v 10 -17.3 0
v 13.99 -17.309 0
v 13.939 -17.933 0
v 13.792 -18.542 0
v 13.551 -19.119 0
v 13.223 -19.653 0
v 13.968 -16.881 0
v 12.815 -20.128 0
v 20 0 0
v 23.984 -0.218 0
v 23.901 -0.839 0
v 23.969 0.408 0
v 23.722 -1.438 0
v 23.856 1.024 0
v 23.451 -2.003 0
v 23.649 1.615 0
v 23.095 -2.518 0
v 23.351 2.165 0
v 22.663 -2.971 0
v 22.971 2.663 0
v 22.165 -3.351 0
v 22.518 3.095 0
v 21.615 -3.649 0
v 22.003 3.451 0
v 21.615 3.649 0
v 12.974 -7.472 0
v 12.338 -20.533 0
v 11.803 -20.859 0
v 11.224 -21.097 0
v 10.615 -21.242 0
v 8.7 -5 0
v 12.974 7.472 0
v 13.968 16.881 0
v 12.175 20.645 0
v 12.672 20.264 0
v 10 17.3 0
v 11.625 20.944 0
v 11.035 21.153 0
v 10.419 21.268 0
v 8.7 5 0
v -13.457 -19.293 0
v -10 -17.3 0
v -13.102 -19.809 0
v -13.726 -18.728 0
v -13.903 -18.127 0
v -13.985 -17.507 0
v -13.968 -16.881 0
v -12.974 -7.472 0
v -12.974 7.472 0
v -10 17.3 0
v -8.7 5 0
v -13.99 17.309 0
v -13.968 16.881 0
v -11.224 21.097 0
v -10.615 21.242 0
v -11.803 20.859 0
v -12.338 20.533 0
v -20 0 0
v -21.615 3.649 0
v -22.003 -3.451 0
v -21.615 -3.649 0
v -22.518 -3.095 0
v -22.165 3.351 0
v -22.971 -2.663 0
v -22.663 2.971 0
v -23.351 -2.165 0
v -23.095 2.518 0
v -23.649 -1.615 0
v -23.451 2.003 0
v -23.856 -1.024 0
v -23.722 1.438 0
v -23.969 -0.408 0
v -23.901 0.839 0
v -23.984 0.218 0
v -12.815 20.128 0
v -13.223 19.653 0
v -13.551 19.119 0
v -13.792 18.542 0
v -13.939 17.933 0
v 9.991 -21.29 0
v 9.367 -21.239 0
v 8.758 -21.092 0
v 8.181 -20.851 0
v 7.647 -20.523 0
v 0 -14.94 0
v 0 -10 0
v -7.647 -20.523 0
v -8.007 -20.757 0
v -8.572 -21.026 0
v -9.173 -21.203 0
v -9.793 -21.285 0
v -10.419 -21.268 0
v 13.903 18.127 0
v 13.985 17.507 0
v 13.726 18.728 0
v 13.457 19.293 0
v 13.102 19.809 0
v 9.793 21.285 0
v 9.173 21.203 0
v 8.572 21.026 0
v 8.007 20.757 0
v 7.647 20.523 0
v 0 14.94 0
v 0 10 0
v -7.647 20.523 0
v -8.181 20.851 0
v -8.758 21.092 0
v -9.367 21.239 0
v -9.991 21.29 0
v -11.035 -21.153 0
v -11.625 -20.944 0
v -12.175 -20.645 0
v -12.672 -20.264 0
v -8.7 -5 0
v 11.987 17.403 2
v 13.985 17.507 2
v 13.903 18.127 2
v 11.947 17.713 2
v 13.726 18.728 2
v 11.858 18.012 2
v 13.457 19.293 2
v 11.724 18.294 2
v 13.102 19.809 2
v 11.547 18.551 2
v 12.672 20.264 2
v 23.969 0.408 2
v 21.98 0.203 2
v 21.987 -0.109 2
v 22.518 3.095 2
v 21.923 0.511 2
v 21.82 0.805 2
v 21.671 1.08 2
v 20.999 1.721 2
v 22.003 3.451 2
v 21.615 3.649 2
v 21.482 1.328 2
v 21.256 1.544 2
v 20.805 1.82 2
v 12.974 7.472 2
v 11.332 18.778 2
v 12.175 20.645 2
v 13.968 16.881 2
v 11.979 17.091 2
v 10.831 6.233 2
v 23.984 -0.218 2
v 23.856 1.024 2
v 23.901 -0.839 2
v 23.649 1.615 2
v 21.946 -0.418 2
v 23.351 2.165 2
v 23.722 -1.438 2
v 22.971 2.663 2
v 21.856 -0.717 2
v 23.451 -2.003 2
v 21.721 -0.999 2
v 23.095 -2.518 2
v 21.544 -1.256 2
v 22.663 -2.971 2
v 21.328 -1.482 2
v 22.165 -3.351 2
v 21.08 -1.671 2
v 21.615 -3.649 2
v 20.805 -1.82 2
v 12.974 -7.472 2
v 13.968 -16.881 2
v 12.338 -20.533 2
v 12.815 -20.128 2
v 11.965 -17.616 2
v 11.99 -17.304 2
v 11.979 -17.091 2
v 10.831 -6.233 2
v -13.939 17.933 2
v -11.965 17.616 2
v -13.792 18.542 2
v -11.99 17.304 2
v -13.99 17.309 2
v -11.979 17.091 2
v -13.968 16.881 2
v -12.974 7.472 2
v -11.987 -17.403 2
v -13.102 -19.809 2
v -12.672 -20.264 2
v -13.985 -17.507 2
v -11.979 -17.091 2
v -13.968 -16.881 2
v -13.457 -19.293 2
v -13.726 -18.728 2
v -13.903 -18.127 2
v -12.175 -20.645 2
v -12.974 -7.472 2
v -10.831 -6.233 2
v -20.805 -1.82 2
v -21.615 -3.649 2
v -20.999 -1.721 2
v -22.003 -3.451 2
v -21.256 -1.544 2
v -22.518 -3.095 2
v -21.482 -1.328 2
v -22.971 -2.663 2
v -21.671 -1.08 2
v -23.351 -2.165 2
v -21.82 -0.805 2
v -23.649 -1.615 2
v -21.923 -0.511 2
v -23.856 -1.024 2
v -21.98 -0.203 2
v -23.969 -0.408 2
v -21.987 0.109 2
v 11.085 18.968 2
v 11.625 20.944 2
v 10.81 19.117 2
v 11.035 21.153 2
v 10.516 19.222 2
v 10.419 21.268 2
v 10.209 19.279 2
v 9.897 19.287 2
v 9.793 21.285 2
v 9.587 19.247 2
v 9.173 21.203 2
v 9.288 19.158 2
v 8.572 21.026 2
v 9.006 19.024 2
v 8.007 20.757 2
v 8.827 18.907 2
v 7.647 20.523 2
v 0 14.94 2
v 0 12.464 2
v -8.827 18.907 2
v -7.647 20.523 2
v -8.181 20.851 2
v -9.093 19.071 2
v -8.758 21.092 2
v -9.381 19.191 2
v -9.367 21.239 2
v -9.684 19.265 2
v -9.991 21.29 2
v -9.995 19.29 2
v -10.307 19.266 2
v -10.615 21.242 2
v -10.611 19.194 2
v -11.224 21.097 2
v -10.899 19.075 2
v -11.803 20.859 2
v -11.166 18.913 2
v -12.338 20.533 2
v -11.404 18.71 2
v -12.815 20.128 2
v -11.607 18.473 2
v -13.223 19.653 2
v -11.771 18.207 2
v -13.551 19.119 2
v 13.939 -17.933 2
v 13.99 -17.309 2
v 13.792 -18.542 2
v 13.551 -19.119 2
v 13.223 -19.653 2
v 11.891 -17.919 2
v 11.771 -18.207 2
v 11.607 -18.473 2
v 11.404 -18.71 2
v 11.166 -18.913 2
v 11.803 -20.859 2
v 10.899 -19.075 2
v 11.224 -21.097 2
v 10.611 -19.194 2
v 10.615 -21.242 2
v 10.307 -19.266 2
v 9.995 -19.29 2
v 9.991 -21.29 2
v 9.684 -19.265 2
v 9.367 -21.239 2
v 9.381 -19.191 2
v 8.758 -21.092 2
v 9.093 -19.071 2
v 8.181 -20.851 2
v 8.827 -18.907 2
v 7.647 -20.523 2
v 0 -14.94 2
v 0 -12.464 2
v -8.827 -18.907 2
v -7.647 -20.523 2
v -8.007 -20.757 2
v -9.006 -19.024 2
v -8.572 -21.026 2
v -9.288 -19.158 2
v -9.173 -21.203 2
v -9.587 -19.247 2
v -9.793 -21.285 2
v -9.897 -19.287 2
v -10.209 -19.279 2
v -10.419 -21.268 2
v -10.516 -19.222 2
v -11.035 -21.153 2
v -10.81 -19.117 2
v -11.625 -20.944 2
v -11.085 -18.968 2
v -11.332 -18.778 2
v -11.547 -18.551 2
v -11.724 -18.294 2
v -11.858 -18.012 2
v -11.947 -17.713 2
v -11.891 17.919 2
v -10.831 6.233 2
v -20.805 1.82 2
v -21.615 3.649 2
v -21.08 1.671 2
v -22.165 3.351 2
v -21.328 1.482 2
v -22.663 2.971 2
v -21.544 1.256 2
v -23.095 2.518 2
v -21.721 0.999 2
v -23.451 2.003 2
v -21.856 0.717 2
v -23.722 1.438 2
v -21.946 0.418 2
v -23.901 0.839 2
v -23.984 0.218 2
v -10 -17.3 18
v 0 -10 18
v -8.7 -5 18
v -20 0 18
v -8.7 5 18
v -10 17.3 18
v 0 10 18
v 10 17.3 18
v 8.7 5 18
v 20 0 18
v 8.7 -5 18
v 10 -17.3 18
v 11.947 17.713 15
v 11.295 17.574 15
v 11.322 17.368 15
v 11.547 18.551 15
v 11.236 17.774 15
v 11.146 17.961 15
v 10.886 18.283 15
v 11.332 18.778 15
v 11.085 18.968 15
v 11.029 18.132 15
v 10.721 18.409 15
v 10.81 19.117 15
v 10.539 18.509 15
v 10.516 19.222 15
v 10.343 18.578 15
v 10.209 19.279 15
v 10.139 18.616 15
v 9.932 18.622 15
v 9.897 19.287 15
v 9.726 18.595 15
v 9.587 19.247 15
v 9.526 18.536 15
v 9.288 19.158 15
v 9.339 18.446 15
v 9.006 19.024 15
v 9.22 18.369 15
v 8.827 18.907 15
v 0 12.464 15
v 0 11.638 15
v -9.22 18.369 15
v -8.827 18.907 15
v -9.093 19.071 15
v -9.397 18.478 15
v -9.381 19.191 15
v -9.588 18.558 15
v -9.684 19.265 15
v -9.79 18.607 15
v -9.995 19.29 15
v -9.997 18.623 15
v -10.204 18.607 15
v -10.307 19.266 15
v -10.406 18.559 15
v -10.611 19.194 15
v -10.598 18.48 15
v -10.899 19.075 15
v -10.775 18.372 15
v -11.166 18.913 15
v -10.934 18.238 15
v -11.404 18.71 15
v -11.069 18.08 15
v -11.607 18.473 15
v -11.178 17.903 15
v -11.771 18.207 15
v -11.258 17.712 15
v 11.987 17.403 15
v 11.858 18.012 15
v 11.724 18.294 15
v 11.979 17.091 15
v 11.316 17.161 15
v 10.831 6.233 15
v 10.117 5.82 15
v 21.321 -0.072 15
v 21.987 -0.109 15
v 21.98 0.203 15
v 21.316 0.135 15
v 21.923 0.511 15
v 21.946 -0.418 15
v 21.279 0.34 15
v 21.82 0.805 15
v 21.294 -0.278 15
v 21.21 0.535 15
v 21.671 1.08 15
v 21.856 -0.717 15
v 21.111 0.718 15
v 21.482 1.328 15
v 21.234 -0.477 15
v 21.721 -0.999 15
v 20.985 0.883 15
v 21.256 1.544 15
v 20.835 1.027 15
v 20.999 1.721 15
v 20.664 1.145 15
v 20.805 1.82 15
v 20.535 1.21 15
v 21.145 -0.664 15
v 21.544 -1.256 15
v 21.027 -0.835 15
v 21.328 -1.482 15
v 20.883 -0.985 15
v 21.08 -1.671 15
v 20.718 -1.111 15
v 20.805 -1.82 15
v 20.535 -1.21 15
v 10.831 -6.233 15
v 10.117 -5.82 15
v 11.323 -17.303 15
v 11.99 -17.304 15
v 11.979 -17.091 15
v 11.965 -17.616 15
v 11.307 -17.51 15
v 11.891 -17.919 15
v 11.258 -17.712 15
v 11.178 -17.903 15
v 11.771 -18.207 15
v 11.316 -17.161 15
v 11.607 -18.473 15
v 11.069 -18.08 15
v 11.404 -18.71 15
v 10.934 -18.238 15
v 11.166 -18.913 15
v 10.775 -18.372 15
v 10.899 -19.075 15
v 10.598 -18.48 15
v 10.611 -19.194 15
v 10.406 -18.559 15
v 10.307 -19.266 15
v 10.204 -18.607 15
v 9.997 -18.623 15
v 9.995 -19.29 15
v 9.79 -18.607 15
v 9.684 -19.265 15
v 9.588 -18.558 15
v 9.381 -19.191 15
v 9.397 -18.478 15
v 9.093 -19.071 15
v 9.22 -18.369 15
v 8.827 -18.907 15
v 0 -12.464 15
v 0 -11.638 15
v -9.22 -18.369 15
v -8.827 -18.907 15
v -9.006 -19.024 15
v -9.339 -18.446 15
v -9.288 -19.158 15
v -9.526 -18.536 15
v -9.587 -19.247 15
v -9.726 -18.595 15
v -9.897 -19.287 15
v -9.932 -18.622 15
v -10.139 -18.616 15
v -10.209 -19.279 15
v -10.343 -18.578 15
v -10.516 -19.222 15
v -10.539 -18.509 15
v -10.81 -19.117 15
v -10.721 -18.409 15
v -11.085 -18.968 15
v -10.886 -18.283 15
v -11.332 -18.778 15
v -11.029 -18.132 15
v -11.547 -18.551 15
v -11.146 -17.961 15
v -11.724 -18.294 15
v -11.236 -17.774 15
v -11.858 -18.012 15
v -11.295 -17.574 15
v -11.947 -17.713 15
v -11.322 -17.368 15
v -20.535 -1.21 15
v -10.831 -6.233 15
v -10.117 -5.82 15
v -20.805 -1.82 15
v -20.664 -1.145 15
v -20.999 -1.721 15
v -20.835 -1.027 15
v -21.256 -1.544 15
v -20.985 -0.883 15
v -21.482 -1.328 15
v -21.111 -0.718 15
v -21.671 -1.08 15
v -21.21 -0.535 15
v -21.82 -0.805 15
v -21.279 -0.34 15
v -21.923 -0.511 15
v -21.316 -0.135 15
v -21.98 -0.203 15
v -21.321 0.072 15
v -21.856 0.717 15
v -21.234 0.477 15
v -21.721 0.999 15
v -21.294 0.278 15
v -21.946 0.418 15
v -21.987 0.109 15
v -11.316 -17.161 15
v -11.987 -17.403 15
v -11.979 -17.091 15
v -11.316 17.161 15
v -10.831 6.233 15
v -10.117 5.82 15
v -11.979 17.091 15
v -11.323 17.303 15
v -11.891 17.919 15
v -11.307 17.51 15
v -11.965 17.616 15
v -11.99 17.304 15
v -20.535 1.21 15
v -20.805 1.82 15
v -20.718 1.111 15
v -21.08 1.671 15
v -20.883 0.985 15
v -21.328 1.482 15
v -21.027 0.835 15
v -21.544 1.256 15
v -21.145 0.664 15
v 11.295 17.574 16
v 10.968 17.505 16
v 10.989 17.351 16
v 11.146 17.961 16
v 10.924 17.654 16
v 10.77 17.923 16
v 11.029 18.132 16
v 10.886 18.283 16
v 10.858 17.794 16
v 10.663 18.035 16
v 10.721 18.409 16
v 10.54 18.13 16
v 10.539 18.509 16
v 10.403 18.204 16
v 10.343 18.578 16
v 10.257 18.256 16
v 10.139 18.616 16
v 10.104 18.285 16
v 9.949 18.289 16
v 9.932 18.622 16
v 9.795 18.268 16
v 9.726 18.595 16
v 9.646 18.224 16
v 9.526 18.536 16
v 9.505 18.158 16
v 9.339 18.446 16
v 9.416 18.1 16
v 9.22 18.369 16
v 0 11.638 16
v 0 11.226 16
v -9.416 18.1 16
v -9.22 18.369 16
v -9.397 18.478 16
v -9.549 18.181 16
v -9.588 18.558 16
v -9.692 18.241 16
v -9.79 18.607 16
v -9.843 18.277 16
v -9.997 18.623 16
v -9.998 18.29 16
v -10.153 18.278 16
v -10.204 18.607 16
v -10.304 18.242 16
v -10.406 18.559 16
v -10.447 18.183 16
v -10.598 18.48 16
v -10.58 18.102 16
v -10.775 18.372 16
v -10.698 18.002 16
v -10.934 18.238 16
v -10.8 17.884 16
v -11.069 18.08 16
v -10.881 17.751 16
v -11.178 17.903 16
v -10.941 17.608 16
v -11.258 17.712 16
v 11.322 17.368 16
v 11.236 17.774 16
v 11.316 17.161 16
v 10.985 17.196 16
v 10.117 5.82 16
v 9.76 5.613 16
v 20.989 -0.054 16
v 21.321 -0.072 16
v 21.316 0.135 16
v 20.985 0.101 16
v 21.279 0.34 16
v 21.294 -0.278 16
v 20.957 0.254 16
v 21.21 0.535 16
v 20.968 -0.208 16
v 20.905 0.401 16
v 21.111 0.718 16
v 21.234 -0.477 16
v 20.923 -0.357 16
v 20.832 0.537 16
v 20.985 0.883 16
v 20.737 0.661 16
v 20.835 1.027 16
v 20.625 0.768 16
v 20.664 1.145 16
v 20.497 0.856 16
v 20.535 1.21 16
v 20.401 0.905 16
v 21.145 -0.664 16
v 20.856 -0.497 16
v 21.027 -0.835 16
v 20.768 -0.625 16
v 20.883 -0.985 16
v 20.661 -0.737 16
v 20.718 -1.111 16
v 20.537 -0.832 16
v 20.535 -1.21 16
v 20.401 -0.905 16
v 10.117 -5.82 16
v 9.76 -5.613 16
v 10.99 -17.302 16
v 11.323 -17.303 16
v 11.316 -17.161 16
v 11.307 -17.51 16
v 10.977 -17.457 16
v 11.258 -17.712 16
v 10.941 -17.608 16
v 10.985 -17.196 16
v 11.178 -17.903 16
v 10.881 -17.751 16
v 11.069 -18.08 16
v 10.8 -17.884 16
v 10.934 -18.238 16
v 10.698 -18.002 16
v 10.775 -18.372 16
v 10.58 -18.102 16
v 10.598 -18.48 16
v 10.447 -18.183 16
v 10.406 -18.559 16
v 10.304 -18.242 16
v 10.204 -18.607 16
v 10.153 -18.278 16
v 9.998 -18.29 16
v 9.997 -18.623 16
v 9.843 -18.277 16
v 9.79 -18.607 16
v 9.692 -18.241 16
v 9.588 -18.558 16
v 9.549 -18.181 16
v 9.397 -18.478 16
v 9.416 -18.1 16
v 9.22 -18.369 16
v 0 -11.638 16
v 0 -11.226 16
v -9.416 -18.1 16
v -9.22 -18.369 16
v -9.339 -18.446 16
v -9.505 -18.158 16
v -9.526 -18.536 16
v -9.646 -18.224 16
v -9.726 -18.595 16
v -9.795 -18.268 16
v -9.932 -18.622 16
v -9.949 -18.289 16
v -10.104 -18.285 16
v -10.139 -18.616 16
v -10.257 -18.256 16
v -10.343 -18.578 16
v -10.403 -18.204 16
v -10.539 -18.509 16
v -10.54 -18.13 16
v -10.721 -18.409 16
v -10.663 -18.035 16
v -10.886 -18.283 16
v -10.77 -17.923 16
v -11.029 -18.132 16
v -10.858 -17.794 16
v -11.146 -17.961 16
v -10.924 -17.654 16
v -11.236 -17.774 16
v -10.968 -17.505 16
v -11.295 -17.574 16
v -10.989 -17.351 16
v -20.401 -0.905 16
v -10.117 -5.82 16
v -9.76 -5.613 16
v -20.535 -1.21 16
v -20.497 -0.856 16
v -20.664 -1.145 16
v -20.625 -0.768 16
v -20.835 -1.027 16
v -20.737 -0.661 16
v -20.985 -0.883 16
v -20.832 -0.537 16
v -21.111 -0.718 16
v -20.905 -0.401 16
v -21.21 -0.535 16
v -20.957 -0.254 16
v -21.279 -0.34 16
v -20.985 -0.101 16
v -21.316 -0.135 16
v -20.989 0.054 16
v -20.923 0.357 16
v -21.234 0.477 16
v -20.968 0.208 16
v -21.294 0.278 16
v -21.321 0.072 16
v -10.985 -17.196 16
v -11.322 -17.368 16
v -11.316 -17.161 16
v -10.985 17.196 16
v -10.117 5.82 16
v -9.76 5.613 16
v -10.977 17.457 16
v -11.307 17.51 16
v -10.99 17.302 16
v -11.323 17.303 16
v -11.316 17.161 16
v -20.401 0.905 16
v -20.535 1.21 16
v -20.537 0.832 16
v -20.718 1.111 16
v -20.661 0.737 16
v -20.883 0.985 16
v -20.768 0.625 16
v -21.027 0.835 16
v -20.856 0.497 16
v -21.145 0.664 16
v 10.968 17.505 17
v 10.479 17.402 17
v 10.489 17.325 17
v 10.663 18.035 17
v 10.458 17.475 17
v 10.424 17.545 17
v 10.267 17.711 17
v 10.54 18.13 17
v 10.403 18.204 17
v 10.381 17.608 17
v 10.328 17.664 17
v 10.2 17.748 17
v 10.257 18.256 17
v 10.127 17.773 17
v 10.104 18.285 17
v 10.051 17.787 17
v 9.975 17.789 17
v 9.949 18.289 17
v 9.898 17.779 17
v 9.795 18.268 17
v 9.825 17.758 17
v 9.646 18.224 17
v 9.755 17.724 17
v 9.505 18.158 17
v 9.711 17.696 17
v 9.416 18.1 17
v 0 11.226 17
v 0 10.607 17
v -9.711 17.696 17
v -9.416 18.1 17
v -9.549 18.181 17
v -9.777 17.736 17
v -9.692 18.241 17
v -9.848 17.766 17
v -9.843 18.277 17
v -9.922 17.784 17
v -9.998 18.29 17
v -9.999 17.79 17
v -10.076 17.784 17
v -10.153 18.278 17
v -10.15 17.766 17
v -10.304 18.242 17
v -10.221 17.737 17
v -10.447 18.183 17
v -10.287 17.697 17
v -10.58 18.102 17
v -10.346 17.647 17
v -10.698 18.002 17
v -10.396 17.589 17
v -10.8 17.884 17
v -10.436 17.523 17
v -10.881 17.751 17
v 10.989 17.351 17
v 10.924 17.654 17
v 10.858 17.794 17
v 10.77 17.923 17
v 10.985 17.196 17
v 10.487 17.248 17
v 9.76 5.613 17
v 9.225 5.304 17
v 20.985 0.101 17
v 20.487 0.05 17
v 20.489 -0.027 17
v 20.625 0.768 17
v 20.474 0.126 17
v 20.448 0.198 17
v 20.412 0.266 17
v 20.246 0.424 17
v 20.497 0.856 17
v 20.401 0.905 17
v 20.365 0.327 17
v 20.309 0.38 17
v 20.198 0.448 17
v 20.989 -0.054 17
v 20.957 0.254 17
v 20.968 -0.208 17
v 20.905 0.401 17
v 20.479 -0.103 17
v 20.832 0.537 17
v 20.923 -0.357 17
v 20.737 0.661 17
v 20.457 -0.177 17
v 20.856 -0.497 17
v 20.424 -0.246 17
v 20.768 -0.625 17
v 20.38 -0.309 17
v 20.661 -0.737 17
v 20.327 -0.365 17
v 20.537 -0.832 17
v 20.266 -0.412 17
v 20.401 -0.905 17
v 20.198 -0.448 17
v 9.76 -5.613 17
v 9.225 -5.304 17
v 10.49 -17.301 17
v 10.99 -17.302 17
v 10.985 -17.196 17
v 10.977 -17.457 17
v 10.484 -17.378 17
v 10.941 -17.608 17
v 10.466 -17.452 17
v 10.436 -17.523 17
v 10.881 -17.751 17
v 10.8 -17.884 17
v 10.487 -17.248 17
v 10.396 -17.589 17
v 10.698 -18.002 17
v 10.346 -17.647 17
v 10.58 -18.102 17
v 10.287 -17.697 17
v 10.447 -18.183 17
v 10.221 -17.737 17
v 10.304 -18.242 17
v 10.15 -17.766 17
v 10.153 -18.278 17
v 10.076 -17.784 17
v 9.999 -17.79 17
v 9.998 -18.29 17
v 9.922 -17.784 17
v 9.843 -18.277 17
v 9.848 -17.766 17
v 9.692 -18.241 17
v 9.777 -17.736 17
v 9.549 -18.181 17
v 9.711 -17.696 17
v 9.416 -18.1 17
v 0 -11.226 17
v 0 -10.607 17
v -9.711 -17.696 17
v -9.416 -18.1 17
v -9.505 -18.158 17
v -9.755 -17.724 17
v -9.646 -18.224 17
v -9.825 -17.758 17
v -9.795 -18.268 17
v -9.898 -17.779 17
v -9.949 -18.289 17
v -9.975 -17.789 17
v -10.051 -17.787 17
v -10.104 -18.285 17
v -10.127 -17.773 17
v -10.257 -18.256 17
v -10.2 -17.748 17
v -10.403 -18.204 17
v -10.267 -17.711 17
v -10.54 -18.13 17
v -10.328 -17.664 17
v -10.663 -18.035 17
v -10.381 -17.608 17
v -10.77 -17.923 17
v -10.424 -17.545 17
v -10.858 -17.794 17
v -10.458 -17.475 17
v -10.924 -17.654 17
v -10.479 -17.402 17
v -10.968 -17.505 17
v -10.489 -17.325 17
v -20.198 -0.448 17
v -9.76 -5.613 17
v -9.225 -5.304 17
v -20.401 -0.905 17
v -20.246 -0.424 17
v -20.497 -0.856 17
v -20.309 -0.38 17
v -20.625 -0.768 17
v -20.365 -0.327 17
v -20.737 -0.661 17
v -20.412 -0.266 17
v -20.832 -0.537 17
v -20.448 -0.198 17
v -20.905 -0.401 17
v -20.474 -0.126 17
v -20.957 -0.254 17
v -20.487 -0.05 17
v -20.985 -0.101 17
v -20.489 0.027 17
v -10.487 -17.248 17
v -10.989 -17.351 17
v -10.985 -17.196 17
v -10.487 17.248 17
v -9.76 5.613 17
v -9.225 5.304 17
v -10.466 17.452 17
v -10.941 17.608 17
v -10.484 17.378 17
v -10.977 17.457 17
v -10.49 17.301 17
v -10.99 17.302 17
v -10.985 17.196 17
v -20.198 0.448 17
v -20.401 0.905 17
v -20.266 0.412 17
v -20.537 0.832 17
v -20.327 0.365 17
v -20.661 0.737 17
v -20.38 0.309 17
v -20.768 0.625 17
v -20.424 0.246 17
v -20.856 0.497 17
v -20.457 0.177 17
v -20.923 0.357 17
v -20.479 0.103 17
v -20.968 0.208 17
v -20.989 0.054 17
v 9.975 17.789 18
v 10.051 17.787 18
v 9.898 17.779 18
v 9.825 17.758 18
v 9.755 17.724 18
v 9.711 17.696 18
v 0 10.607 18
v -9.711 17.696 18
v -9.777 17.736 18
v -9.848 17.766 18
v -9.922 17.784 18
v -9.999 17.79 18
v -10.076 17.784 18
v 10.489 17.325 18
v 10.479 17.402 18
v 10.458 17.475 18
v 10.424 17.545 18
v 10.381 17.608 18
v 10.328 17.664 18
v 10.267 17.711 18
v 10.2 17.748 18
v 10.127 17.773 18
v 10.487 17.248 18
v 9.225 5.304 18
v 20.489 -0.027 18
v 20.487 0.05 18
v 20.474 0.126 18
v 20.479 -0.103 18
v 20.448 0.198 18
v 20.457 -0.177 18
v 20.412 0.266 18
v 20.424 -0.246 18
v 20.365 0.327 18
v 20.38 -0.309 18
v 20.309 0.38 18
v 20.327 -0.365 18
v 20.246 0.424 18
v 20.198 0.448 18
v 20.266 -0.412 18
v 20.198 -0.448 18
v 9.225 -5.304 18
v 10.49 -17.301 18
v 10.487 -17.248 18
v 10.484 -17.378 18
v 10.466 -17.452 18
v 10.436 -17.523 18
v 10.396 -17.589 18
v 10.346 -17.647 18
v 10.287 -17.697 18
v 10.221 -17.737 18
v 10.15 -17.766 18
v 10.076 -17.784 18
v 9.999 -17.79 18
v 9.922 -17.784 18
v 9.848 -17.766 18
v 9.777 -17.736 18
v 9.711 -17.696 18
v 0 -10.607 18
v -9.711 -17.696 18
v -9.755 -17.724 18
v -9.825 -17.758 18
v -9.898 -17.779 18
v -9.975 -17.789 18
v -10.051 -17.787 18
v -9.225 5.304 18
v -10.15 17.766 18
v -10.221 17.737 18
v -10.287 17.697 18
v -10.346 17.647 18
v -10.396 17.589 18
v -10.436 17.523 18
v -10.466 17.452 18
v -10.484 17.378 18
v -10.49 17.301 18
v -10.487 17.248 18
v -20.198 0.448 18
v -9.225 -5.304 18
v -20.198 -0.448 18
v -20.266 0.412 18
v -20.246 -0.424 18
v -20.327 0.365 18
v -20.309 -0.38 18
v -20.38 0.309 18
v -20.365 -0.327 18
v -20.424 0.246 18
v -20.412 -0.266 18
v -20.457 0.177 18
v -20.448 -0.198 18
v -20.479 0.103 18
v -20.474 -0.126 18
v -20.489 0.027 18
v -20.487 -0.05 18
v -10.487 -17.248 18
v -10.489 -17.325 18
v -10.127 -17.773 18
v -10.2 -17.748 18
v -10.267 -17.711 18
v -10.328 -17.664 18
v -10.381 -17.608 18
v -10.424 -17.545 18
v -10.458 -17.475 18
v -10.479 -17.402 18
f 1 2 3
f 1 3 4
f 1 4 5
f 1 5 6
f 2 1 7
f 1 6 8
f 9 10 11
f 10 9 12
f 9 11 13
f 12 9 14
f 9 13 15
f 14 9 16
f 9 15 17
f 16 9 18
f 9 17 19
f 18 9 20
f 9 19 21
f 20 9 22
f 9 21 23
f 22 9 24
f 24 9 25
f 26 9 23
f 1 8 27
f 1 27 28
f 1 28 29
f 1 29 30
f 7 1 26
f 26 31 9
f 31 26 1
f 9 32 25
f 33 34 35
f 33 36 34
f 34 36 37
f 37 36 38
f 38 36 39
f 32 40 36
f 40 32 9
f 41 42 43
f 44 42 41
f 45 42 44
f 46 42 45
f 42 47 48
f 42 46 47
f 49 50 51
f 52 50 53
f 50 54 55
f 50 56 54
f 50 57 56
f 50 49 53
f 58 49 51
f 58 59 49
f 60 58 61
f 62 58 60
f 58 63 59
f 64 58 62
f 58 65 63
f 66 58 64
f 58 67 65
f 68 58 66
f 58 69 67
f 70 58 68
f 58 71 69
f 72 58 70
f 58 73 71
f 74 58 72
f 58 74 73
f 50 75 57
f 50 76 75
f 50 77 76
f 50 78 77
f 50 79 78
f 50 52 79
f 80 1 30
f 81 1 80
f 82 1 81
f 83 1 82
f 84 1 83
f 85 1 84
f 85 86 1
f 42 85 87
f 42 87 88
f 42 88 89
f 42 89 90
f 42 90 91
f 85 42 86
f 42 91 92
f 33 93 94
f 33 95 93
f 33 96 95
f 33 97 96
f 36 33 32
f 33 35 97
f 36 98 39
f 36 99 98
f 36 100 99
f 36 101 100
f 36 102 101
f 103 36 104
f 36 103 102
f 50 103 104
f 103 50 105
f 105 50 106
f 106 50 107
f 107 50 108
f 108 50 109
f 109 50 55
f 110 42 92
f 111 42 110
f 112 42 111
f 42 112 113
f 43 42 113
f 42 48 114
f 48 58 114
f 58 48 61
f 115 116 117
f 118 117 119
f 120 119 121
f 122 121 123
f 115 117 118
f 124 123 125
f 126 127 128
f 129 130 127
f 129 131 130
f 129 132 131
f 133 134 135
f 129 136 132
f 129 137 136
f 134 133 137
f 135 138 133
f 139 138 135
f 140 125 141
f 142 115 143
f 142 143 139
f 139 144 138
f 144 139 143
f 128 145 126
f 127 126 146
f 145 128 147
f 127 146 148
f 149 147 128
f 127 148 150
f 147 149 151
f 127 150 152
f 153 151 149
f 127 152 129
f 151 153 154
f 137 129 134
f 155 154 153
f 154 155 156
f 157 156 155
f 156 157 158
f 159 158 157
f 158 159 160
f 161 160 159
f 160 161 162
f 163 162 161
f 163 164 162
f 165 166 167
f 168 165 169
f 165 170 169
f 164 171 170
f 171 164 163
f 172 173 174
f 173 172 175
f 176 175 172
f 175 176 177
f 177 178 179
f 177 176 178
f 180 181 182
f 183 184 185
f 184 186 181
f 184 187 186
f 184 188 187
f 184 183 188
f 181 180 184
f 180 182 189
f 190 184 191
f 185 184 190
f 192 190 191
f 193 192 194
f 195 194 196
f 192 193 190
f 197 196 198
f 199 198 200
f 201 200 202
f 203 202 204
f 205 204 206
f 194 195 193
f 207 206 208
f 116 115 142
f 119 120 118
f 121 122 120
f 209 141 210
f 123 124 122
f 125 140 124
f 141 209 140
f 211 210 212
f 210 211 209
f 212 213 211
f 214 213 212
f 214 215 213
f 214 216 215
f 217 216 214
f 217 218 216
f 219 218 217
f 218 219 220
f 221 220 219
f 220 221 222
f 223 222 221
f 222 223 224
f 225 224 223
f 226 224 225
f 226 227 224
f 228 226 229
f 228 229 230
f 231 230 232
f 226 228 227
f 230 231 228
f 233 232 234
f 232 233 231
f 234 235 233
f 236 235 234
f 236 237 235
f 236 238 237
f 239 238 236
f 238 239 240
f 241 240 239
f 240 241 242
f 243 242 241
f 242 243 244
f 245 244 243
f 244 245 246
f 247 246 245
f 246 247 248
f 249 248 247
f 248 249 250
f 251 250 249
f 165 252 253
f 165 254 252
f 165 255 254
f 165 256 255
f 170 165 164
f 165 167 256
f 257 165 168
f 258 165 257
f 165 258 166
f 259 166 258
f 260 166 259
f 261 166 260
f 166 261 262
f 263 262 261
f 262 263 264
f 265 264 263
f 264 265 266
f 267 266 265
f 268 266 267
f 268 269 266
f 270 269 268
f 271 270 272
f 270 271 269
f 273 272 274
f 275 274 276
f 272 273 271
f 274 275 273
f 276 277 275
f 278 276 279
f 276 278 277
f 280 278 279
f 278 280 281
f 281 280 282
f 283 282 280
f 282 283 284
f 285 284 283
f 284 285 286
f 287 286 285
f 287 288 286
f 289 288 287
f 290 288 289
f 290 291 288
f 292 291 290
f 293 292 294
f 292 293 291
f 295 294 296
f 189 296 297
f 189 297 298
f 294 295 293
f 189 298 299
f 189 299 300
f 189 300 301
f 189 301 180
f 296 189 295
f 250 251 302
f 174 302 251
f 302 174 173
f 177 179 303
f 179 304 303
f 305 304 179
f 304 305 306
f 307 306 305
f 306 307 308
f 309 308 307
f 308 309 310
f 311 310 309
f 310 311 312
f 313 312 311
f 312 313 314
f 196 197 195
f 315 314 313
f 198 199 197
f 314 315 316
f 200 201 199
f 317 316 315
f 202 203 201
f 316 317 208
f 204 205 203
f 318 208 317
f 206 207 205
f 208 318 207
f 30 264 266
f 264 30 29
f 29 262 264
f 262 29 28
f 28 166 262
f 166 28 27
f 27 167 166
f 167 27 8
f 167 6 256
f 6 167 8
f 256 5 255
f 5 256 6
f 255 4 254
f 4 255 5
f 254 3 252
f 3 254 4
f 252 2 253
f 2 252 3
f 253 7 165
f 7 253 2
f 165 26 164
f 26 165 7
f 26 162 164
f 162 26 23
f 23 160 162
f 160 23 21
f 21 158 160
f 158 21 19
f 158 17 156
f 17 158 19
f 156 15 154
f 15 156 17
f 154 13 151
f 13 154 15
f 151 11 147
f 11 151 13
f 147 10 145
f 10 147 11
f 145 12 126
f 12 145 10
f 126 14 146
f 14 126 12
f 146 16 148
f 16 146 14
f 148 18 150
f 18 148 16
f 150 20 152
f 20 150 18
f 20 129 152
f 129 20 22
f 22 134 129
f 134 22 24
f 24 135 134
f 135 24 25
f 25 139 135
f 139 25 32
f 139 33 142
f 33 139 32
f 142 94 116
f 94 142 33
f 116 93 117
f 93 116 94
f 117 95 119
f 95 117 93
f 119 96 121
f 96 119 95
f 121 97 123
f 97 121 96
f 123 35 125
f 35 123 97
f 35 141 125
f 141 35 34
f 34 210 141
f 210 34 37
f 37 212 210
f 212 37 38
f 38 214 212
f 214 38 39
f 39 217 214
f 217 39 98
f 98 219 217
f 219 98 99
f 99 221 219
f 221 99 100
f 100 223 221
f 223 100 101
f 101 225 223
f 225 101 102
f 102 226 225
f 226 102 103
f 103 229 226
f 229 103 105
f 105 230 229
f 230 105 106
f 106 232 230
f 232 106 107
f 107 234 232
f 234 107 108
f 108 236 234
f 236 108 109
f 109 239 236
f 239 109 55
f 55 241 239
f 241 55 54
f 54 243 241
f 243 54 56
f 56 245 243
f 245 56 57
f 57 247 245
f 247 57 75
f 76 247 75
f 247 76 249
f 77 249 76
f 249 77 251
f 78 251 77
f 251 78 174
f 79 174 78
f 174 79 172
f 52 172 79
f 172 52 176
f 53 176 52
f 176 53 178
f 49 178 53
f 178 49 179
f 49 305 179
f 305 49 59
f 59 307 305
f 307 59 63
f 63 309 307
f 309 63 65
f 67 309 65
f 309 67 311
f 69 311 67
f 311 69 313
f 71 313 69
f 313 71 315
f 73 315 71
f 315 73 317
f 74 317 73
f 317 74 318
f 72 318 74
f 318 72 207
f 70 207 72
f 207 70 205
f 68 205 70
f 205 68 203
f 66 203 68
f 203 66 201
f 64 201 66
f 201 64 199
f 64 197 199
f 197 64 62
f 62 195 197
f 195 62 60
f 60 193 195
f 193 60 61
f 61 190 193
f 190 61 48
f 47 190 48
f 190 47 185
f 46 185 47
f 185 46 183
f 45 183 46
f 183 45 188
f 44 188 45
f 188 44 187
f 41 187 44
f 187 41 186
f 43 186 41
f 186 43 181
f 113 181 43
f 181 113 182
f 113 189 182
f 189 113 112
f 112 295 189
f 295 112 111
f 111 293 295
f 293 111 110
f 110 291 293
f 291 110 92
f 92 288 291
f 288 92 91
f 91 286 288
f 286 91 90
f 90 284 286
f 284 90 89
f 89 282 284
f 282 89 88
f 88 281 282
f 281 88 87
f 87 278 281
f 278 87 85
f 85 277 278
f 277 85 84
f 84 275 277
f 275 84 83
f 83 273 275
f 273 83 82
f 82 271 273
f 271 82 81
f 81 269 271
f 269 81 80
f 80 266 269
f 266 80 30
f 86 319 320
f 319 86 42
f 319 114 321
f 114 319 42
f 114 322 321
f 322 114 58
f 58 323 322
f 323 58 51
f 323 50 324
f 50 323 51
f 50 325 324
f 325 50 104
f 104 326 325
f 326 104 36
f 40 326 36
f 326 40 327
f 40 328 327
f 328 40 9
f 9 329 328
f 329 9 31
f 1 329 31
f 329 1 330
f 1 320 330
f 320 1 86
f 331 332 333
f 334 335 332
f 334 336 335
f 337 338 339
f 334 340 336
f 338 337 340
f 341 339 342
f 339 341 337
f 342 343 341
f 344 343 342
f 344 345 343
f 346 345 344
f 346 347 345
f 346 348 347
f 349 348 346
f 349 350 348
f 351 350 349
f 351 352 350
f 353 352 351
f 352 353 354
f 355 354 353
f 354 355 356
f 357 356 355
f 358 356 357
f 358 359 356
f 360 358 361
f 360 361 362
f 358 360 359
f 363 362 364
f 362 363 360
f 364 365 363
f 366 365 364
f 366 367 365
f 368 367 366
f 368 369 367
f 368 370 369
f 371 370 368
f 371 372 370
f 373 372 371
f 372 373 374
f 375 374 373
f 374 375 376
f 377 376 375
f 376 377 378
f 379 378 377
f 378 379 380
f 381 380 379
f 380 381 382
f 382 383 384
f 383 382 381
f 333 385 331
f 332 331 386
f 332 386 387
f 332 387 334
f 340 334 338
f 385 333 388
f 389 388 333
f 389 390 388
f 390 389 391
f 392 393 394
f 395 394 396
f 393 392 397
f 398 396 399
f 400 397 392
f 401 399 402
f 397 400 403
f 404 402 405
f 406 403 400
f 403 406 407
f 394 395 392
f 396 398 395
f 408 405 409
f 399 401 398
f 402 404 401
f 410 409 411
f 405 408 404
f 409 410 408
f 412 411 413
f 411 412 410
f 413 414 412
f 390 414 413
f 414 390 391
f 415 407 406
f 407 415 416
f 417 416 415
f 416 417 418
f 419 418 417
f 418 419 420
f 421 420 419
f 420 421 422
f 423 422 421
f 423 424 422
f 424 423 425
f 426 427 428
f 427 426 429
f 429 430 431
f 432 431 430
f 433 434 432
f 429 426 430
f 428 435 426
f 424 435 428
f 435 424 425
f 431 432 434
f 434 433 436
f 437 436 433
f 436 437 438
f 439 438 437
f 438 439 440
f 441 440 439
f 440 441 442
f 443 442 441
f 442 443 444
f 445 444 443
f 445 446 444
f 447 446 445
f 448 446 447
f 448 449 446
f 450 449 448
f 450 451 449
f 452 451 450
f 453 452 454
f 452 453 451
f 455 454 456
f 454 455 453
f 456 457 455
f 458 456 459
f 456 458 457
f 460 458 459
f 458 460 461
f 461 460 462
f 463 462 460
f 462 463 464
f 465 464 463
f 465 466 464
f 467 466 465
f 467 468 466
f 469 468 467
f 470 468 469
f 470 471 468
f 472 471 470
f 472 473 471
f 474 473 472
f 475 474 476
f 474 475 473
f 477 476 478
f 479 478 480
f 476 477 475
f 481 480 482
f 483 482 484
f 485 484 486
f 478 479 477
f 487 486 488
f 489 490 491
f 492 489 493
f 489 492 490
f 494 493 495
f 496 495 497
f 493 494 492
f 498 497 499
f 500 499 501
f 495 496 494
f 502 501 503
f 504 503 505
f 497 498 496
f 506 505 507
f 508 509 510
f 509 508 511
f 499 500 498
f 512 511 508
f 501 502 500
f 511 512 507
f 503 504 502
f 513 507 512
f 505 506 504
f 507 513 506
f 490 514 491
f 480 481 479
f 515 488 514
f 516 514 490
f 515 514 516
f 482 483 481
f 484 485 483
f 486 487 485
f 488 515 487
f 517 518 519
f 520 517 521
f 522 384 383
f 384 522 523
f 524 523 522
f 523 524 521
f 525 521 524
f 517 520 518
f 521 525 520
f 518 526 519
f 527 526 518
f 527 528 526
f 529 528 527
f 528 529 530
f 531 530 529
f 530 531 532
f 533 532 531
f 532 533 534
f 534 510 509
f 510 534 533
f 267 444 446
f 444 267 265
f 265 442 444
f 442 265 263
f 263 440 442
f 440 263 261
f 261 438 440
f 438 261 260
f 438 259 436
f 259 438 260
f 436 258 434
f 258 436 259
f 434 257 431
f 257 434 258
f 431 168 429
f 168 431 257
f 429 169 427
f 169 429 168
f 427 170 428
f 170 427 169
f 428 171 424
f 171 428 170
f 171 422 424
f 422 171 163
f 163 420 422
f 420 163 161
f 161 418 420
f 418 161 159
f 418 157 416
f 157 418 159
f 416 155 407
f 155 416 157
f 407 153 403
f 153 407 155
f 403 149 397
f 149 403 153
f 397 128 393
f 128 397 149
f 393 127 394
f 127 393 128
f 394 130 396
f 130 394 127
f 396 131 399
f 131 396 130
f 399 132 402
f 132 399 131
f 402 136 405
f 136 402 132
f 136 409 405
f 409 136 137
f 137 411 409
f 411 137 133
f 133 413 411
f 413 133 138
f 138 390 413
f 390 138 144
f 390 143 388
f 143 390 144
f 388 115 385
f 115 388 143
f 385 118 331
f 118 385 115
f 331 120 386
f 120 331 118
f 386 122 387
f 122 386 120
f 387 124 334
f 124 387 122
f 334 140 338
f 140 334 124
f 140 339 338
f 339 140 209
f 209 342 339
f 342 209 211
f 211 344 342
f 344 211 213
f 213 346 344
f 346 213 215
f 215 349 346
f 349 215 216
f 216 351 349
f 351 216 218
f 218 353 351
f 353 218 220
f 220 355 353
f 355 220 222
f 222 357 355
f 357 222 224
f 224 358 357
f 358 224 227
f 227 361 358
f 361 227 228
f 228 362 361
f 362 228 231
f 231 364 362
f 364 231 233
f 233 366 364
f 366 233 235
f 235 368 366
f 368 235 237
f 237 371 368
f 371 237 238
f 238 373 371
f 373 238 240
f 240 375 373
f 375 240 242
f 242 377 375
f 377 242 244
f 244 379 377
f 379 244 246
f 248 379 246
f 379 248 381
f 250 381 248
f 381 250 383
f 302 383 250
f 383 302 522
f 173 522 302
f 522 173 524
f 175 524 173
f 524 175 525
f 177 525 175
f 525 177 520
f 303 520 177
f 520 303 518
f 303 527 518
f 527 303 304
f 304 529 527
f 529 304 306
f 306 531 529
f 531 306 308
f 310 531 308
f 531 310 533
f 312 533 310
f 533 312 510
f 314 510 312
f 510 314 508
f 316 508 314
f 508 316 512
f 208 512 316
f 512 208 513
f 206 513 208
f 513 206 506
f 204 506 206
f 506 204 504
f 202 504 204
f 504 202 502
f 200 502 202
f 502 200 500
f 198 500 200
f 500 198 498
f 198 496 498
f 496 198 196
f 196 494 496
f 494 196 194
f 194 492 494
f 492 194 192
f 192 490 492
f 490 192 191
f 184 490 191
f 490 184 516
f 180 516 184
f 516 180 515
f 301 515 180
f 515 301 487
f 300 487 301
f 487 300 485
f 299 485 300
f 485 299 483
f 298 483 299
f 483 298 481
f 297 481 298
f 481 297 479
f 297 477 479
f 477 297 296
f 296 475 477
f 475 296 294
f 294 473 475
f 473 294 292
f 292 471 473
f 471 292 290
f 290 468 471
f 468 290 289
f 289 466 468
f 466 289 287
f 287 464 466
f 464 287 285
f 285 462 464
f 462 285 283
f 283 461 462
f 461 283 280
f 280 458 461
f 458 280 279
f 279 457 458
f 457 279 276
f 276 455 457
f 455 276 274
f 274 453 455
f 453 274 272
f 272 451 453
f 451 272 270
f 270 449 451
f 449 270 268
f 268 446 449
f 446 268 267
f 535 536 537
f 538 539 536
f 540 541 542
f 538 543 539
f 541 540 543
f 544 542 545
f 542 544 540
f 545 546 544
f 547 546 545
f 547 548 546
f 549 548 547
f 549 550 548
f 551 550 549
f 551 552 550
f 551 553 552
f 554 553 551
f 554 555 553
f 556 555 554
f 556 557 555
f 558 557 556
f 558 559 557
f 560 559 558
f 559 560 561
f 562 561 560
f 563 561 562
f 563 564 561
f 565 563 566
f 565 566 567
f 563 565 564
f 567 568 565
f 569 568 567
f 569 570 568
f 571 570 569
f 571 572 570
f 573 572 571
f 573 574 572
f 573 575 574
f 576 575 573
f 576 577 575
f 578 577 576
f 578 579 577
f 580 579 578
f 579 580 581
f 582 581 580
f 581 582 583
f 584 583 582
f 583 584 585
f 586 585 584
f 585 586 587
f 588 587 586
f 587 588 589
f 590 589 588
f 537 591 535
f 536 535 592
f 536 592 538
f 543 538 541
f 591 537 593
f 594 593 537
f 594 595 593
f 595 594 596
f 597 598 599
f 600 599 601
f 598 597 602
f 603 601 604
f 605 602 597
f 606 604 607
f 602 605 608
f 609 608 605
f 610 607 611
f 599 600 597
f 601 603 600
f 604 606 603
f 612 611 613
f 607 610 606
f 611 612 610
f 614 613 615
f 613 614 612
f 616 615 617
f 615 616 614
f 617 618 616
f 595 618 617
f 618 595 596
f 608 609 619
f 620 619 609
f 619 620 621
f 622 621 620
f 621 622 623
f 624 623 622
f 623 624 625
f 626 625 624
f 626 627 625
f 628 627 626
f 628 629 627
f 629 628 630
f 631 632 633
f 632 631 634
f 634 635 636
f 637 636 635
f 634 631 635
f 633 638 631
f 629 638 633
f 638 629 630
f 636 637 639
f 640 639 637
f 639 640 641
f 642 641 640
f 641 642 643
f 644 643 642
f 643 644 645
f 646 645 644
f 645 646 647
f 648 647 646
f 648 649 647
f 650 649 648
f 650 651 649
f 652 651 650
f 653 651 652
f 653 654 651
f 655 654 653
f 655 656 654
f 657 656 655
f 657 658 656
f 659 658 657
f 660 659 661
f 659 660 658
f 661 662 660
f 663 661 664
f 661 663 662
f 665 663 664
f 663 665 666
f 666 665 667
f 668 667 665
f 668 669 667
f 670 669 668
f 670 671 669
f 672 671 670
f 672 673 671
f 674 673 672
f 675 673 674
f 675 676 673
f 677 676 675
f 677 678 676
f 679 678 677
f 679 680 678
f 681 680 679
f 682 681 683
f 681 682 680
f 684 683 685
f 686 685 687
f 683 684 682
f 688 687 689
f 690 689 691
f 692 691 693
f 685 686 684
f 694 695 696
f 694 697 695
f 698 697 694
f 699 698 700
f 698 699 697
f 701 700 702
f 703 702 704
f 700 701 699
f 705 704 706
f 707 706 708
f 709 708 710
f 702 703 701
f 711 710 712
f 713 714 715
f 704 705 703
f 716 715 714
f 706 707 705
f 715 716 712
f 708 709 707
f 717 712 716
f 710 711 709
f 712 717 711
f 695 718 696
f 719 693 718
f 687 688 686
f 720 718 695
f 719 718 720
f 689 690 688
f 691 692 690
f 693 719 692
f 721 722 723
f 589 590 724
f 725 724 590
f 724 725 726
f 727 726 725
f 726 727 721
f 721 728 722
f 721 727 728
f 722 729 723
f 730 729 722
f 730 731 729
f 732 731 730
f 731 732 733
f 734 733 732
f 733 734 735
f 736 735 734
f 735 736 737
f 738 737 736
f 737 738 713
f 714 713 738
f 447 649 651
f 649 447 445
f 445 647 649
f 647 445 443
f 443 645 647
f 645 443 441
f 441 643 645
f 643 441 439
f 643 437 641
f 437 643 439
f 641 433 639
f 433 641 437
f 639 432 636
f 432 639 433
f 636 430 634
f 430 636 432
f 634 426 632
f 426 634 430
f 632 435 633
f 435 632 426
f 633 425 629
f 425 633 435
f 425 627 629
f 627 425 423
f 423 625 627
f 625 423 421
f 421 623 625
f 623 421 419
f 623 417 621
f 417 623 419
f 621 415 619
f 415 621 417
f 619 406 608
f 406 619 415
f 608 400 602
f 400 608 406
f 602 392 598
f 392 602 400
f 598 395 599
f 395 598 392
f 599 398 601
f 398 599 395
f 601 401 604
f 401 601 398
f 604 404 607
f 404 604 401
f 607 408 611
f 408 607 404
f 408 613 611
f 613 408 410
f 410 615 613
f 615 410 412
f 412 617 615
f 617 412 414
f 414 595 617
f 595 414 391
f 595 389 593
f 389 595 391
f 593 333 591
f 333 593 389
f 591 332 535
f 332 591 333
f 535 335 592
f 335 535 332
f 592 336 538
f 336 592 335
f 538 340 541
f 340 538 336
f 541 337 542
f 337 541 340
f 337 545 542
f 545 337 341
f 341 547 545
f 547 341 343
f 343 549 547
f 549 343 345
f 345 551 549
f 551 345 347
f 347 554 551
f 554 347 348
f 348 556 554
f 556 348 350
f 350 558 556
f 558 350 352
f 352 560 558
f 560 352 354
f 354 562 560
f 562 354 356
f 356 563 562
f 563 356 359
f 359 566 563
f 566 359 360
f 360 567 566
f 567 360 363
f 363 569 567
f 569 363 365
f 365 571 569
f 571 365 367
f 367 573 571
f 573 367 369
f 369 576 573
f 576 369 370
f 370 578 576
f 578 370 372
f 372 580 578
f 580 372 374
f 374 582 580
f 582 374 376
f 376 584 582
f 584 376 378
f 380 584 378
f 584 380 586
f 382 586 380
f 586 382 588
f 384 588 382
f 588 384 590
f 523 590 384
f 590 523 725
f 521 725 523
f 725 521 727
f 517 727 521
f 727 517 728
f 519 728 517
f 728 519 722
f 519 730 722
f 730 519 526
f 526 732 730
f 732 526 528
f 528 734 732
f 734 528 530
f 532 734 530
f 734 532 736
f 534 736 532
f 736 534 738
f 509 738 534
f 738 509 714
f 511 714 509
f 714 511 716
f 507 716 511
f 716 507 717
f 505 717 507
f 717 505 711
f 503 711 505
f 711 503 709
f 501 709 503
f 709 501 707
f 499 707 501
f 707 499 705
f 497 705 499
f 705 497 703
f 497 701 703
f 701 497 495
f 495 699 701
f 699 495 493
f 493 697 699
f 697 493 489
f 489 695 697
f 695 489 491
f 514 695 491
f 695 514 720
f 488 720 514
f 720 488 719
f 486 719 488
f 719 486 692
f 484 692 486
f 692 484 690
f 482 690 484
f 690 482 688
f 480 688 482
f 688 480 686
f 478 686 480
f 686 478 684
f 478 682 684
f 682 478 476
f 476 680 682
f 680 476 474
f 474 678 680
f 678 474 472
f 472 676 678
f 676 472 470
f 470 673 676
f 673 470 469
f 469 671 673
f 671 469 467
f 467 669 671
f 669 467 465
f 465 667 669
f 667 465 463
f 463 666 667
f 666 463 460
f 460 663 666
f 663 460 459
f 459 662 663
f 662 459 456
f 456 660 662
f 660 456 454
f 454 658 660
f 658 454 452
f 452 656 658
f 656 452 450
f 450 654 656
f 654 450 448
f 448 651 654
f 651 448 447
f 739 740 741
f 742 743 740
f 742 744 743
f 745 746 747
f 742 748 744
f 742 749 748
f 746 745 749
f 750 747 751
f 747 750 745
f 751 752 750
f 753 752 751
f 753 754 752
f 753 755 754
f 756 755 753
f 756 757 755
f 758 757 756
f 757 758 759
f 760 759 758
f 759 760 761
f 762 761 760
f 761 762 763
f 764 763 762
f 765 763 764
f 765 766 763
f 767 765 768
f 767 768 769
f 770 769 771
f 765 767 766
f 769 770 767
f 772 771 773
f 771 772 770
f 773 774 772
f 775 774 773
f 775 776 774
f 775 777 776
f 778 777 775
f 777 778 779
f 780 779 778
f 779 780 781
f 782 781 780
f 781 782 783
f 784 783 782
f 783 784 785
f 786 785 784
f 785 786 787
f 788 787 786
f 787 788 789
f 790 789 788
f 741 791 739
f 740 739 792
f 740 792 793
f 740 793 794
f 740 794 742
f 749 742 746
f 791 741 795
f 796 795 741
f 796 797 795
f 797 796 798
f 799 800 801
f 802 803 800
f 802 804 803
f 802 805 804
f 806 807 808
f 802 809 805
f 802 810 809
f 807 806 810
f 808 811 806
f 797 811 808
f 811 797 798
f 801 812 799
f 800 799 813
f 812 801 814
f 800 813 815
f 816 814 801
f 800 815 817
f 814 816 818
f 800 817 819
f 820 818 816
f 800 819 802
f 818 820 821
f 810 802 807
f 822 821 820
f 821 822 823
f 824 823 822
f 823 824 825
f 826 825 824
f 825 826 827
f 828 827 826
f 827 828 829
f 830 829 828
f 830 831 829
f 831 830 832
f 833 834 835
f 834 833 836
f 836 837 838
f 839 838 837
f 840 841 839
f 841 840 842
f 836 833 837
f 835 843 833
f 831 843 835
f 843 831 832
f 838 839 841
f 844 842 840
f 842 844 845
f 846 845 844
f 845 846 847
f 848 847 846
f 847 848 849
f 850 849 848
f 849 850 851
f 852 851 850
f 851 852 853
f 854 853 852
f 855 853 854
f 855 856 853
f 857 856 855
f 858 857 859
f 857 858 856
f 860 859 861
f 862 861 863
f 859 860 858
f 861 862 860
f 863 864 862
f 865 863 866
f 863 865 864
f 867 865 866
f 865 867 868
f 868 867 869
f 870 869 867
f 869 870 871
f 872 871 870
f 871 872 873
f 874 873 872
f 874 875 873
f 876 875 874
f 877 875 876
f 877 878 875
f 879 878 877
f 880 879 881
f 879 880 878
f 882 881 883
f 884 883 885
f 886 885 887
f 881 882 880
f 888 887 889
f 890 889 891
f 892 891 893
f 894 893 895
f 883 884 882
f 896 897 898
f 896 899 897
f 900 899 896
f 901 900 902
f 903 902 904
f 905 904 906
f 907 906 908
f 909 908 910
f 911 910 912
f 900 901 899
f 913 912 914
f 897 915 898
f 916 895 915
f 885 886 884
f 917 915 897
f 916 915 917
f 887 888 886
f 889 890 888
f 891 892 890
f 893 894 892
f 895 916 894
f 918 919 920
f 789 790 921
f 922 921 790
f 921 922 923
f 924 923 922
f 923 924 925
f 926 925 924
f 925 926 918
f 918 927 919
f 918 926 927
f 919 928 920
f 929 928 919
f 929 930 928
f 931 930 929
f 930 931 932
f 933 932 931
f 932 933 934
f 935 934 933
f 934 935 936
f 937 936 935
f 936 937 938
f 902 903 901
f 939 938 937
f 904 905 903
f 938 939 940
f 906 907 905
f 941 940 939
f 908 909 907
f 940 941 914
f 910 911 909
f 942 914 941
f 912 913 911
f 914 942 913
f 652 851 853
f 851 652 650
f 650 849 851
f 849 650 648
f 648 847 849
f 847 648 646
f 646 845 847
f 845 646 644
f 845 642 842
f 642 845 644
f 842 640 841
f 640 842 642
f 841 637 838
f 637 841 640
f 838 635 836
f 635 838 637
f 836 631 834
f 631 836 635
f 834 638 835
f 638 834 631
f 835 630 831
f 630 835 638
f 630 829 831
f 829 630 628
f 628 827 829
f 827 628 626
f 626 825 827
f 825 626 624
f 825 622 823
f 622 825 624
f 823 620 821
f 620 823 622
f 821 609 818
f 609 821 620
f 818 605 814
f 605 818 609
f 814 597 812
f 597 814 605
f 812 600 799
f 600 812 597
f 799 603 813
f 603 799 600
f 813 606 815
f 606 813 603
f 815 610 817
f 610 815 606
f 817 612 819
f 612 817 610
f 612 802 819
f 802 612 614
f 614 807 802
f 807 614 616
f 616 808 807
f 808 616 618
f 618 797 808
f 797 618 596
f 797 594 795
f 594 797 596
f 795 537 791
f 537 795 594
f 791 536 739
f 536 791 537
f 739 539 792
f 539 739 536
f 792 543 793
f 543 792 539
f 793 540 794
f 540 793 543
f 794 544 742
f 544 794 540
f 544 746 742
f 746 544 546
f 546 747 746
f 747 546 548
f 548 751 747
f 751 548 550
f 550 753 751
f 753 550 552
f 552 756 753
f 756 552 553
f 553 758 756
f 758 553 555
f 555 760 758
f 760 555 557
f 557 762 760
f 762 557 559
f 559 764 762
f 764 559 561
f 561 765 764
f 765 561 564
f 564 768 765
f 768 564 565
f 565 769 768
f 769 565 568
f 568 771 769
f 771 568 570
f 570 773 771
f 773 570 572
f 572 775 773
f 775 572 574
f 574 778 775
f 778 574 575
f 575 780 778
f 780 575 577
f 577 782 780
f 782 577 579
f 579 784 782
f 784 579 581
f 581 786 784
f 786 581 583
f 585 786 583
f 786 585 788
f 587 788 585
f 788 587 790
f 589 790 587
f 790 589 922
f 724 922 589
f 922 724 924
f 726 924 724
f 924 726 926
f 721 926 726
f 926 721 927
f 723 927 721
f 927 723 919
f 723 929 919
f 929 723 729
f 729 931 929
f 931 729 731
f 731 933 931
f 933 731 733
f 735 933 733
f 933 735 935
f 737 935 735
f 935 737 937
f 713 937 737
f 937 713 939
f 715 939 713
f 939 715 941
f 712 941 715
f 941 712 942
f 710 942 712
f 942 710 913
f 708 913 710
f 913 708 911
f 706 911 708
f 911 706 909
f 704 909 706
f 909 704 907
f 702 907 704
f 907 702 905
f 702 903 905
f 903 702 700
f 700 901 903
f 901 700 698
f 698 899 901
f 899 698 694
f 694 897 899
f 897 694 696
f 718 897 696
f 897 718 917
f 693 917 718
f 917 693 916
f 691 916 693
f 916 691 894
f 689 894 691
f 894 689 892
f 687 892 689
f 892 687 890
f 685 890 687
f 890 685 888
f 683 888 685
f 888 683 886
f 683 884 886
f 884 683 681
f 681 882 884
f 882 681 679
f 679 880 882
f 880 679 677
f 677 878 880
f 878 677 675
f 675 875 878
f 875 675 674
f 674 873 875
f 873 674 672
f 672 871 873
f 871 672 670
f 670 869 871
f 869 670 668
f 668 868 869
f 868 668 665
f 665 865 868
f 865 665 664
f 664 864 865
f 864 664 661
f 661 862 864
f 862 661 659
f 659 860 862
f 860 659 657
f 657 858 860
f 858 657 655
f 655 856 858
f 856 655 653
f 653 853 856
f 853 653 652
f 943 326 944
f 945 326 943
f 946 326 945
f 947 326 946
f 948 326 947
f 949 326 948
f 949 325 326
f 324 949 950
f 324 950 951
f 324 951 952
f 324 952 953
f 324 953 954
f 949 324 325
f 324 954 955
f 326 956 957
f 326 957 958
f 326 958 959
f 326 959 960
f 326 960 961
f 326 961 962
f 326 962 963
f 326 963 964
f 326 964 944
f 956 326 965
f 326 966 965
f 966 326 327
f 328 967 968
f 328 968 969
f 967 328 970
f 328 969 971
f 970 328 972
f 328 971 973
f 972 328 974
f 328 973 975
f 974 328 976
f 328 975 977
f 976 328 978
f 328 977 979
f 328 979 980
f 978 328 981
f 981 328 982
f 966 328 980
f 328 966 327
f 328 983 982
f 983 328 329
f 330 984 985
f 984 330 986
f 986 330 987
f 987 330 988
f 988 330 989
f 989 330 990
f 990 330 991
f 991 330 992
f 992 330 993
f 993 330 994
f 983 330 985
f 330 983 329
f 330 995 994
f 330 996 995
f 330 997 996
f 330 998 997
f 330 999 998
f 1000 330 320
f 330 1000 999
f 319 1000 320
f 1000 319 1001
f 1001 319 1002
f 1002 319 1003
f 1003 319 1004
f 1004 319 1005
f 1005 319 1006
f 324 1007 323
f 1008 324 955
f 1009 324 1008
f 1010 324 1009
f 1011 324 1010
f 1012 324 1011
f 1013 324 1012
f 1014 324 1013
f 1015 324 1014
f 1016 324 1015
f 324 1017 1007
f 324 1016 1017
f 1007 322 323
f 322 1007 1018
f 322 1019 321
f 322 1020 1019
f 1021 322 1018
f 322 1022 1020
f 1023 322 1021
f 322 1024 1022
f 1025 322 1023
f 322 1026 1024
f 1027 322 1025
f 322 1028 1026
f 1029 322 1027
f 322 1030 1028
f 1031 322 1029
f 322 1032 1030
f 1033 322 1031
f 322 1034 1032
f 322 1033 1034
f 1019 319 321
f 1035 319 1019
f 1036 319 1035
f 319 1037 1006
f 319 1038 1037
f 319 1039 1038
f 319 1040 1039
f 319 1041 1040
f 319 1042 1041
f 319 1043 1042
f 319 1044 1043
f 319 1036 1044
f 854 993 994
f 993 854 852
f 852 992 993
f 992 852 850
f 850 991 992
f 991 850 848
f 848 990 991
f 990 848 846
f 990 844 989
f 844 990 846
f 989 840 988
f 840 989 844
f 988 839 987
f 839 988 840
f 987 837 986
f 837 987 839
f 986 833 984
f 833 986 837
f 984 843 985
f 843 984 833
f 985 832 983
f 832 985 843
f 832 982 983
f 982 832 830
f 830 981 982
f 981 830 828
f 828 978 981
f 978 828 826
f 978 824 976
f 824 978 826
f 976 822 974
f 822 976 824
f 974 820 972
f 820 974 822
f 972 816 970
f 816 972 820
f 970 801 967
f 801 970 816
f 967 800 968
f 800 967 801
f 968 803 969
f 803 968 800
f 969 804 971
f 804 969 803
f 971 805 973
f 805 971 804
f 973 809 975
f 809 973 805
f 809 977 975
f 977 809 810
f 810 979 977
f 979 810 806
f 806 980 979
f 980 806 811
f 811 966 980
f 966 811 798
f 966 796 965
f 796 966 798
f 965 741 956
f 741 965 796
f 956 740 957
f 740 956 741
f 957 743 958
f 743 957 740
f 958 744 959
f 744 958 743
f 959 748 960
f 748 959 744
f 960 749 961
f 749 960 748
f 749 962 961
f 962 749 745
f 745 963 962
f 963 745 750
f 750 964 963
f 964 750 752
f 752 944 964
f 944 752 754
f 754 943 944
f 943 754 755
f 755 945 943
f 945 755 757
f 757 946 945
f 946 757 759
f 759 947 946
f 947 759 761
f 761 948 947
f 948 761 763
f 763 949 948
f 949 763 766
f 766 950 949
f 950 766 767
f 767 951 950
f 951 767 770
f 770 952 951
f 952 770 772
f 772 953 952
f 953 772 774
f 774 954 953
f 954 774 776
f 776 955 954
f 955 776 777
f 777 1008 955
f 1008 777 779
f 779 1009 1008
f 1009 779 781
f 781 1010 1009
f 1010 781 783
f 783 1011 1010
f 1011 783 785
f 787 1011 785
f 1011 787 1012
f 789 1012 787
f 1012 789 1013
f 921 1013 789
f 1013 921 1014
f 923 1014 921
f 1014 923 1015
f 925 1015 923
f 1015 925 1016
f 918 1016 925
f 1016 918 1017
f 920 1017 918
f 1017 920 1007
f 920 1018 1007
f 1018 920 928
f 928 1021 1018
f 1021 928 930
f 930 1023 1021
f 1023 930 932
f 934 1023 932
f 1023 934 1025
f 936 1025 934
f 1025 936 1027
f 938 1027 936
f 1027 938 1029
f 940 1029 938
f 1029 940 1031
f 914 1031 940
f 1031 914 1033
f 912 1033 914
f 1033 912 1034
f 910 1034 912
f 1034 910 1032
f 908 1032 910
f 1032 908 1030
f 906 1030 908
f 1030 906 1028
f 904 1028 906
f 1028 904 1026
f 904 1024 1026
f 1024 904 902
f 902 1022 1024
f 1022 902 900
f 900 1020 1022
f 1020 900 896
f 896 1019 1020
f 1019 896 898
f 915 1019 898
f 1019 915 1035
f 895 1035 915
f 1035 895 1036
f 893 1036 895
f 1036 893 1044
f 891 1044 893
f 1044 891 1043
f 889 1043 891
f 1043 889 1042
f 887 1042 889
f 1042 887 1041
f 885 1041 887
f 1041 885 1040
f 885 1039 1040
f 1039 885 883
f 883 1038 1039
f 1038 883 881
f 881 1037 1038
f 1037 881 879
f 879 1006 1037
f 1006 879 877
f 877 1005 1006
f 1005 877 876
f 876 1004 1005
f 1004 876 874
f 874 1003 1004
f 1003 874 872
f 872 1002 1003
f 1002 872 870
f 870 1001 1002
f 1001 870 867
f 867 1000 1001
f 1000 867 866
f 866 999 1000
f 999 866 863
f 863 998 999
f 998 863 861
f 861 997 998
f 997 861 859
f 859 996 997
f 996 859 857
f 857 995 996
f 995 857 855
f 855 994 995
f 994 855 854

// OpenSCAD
wall   =  2; // [1:0.05:3]
rim    =  4; // [2:0.05:6]
height = 15; // [10:1:15]
index  =  0; // [0,1,2,3,4,5]
spikes =  6; // [5,6]

$fn=40;

// path
star_5=[
// size 10 / 20
[[ 0.0,10.0],	[11.8,16.2],
[ 9.5, 3.1],	[19.0,- 6.2],
[ 5.9,- 8.1],	[ 0.0,-20.0],
[- 5.9,- 8.1],	[-19.0,- 6.2],
[- 9.5, 3.1],	[-11.8,16.2]
],
// size 15 / 30
[[ 0.0,15.0],	[17.6,24.3],
[14.3, 4.6],	[28.5,- 9.3],
[ 8.8,-12.1],	[ 0.0,-30.0],
[- 8.8,-12.1],	[-28.5,- 9.3],
[-14.3, 4.6],	[-17.6,24.3],
],
// size 20 / 40
[[ 0.0,20.0],	[23.5,32.4],
[19.0, 6.2],	[38.0,-12.4],
[11.8,-16.2],	[ 0.0,-40.0],
[-11.8,-16.2],	[-38.0,-12.4],
[-19.0, 6.2],	[-23.5,32.4],
],
// size 25 / 50
[[ 0.0,25.0],	[29.4,40.5],
[23.8, 7.7],	[47.6,-15.5],
[14.7,-20.2],	[ 0.0,-50.0],
[-14.7,-20.2],	[-47.6,-15.5],
[-23.8, 7.7],	[-29.4,40.5],
],
// size 30/ 60
[[ 0.0,30.0],	[35.3,48.5],
[28.5, 9.3],	[57.1,-18.5],
[17.6,-24.3],	[ 0.0,-60.0],
[-17.6,-24.3],	[-57.1,-18.5],
[-28.5, 9.3],	[-35.3,48.5],
]];

star_6=[
// size 10 / 20
[[ 0.0,10.0],	[10.0,17.3],
[ 8.7, 5.0],	[20.0, 0.0],
[ 8.7,- 5.0],	[10.0,-17.3],
[ 0.0,-10.0],	[-10.0,-17.3],
[- 8.7,- 5.0],	[-20.0, 0.0],
[- 8.7, 5.0],	[-10.0,17.3]
],
// size 15 / 30
[[ 0.0,15.0],	[15.0,26.0],
[13.0, 7.5],	[30.0, 0.0],
[13.0,- 7.5],	[15.0,-26.0],
[ 0.0,-15.0],	[-15.0,-26.0],
[-13.0,- 7.5],	[-30.0, 0.0],
[-13.0, 7.5],	[-15.0,26.0]
],
// size 20 / 40
[[ 0.0,20.0],	[20.0,34.6],
[17.3,10.0],	[40.0, 0.0],
[17.3,-10.0],	[20.0,-34.6],
[ 0.0,-20.0],	[-20.0,-34.6],
[-17.3,-10.0],	[-40.0, 0.0],
[-17.3,10.0],	[-20.0,34.6]
],
// size 25 / 50
[[ 0.0,25.0],	[25.0,43.3],
[21.7,12.5],	[50.0, 0.0],
[21.7,-12.5],	[25.0,-43.3],
[ 0.0,-25.0],	[-25.0,-43.3],
[-21.7,-12.5],	[-50.0, 0.0],
[-21.7,12.5],	[-25.0,43.3]
],
// size 30/ 60
[[ 0.0,30.0],	[30.0,52.0],
[26.0,15.0],	[60.0, 0.0],
[26.0,-15.0],	[30.0,-52.0],
[ 0.0,-30.0],	[-30.0,-52.0],
[-26.0,-15.0],	[-60.0, 0.0],
[-26.0,15.0],	[-30.0,52.0]
]];

all();

module all()
{
    /*
    cake(star_5[0],height);
    cake(star_5[1],height);
    cake(star_5[2],height);
    cake(star_5[3],height);
    cake(star_5[4],height);
    */
    /*
    cake(star_6[0],height);
    cake(star_6[1],height);
    cake(star_6[2],height);
    cake(star_6[3],height);
    cake(star_6[4],height);
    */
    if(spikes == 5)
    {
        cake(star_5[index],height);
    }
    if(spikes == 6)
    {
        cake(star_6[index],height);
    }
}

module layer(poly, h, b)
{
    linear_extrude(h)
        difference()
        {
            offset(r=b)   polygon(poly);
            /*offset(r=0-b)*/ polygon(poly);
        }
}

 

module cake(path, height)
{
    // correction fix to avoid needles infill and movements
    fix = 0.01;
    
    // Basis
    layer(path,wall,rim-fix);

    // wall
    layer(path,height,wall-fix);

    // cutter
    layer(path,height+1,wall*2/3-fix);
    layer(path,height+2,wall/2-fix);
    layer(path,height+3,wall/4-fix);

}
